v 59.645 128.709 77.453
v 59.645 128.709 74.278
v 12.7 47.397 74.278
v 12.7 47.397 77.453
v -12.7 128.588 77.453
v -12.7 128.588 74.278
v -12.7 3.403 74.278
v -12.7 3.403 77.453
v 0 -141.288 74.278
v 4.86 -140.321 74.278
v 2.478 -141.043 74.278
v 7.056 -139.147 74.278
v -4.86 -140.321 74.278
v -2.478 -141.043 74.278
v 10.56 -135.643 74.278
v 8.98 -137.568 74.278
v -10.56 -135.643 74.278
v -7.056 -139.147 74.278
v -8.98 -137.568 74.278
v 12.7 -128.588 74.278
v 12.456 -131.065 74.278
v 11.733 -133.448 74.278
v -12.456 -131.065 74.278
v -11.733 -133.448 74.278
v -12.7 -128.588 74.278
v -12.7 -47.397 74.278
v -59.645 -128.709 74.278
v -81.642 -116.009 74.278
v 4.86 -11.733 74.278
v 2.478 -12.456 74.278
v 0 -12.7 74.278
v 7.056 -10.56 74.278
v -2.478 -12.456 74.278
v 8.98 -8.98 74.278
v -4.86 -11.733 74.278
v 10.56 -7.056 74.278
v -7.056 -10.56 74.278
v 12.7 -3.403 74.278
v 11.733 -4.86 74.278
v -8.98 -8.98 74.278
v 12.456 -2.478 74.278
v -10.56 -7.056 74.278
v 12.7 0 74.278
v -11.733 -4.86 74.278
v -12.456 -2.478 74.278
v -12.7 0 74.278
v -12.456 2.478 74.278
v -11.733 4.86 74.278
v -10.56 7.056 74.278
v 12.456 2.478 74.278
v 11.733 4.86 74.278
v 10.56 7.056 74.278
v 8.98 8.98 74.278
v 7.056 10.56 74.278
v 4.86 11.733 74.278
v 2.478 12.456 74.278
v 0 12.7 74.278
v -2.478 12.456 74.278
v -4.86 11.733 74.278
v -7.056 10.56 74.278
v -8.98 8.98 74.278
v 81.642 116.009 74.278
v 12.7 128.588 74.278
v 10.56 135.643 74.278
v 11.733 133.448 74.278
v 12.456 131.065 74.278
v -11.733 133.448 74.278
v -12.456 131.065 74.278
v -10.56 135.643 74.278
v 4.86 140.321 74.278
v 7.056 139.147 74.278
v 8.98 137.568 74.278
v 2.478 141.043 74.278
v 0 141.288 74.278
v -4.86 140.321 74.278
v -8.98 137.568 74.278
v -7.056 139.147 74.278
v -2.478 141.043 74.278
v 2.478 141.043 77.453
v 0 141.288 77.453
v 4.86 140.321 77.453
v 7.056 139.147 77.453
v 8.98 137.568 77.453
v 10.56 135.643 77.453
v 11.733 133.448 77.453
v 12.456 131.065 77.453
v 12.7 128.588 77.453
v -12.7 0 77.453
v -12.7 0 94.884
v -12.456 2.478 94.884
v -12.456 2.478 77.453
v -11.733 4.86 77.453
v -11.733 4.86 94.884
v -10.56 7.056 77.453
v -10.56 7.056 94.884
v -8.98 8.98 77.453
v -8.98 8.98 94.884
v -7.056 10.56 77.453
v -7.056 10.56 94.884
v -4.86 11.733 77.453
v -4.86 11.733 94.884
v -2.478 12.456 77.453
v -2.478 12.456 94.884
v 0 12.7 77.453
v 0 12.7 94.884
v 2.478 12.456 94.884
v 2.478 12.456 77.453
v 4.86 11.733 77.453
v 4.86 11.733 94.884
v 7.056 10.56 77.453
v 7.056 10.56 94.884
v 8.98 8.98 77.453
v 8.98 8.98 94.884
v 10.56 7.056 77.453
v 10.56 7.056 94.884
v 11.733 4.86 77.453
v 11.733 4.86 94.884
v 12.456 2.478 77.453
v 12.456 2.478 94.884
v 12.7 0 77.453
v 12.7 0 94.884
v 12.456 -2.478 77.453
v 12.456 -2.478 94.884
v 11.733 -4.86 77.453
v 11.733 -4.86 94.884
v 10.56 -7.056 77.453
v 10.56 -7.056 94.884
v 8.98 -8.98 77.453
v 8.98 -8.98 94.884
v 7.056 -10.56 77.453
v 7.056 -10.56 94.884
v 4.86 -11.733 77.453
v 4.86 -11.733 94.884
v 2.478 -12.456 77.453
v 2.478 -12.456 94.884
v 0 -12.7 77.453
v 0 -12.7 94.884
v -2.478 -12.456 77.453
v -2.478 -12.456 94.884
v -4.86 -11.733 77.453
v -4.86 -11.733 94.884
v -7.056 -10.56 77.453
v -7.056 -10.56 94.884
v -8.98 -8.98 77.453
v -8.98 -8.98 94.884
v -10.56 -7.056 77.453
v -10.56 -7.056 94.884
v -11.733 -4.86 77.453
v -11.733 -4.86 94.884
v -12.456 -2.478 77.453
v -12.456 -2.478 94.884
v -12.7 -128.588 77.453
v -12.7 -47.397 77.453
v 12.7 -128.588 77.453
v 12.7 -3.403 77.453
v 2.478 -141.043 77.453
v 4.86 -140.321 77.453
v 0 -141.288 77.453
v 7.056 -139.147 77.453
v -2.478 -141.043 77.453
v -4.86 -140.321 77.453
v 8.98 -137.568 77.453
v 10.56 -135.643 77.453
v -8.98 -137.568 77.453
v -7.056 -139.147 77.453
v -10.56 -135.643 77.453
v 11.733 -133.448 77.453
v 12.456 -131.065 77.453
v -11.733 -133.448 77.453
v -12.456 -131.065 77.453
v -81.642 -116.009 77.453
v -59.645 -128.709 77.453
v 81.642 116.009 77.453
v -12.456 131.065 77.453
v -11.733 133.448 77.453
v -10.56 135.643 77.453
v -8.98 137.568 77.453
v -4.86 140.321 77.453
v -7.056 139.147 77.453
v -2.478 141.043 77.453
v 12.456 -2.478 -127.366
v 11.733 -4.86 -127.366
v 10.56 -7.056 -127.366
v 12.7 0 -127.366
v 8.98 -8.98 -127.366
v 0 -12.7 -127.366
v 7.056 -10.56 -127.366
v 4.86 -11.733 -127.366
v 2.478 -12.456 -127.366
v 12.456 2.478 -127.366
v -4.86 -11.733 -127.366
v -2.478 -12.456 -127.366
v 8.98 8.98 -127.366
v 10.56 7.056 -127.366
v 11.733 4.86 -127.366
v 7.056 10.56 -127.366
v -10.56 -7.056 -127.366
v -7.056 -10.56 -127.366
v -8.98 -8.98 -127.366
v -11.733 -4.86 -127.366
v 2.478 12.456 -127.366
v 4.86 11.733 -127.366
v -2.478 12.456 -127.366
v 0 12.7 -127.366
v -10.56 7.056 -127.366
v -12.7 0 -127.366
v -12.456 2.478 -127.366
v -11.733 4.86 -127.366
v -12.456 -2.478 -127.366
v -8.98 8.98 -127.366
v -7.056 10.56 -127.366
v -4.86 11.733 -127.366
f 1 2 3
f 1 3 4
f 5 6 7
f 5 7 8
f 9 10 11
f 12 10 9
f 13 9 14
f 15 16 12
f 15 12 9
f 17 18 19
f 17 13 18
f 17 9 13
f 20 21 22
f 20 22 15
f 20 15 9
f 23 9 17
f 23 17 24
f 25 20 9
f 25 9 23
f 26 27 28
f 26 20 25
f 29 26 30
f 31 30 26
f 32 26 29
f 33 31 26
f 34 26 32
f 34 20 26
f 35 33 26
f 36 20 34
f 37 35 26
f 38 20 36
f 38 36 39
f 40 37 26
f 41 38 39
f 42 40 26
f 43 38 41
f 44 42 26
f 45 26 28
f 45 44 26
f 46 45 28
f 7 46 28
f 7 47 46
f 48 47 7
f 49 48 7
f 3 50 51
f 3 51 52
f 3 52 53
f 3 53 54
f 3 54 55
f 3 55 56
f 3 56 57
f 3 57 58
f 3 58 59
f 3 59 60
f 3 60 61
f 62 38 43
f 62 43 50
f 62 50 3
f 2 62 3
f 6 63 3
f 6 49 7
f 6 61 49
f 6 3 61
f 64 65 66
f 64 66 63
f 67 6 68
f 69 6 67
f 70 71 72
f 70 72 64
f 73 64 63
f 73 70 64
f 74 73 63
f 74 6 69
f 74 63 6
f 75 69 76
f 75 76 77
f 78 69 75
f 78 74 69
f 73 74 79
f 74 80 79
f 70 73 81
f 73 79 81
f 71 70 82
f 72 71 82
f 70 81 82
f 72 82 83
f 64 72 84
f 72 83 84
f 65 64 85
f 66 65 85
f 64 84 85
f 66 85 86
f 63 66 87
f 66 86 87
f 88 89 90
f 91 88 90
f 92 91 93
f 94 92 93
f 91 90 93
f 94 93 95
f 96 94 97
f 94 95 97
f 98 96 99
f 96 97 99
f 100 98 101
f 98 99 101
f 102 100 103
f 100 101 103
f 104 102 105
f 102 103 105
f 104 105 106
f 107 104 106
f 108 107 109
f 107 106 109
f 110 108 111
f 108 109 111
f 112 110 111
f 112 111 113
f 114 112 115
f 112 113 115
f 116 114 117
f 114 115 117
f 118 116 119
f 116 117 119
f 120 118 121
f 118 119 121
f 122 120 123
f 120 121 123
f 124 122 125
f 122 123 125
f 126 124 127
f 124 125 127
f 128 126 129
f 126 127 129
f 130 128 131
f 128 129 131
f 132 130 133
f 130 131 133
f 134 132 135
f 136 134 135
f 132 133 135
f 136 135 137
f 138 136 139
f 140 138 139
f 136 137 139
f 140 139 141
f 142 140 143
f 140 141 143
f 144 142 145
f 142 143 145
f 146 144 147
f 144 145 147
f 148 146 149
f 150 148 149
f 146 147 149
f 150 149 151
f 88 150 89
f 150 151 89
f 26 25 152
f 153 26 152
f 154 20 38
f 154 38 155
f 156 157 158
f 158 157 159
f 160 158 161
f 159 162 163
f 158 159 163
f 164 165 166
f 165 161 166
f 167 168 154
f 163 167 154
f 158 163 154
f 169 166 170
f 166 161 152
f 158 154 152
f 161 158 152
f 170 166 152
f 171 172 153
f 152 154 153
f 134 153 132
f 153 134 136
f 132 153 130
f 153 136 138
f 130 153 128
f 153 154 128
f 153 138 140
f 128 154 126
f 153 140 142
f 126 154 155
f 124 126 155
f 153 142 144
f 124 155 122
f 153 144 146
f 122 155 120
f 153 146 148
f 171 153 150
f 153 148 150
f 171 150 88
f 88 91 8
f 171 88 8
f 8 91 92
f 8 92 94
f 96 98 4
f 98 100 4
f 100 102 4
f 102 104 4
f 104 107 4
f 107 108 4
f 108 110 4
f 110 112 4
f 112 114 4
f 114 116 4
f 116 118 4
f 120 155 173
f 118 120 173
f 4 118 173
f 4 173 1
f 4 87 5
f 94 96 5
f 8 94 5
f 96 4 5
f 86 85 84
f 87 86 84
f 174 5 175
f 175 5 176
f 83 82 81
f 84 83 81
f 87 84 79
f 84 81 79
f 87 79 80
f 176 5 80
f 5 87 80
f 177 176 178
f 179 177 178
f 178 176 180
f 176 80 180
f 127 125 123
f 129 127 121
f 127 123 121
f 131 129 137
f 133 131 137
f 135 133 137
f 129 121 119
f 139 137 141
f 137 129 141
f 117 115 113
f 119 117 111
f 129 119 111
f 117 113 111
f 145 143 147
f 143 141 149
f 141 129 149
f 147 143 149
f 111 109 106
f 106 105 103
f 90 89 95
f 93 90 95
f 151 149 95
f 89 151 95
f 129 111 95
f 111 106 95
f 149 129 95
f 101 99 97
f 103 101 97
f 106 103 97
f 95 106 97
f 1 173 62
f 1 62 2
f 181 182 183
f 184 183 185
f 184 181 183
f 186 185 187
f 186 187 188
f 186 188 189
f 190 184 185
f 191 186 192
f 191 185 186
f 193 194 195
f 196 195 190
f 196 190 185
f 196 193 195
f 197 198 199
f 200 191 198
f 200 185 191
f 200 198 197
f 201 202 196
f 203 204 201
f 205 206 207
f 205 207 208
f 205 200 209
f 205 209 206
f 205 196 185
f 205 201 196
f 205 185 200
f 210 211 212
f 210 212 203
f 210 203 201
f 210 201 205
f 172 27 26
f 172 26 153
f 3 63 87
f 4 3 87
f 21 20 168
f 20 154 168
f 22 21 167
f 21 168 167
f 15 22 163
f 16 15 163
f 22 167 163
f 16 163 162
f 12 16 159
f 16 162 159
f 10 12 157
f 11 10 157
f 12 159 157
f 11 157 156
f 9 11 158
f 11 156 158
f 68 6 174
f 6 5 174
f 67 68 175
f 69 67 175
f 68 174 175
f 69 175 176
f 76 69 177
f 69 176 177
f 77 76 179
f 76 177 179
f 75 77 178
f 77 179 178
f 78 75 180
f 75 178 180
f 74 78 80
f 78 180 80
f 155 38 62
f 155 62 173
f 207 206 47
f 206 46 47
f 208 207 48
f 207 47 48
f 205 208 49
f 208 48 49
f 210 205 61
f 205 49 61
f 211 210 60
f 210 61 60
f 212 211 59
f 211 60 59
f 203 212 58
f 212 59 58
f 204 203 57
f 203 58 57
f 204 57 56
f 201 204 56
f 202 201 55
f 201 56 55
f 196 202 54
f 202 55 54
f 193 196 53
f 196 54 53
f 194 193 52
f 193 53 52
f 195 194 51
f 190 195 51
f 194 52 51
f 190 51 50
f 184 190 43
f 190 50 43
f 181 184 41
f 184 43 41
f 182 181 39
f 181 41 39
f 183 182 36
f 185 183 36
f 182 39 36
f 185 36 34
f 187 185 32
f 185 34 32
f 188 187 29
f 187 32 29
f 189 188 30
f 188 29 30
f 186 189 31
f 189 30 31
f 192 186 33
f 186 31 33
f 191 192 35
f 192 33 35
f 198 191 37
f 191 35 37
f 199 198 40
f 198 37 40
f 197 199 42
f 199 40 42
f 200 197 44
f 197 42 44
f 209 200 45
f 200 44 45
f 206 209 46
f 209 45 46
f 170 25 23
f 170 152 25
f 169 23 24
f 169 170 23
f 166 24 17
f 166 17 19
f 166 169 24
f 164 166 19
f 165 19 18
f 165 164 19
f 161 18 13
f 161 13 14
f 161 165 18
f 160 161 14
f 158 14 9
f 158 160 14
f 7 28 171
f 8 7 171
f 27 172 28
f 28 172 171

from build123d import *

# Parameters (mm, degrees)
F0_W     = 12.7
F0_H     = 222.25
F3_W     = 25.4
F3_H     = 3.175
F4_DEPTH = 141.2875
F6_R     = 12.69999
F8_W     = 25.4
F8_H     = 3.175
F9_DEPTH = 141.2875


# Not quite as in the source:
# - a fillet or chamfer is up to 0.001 mm smaller than in the source, because OpenCascade refuses the exact size


with BuildPart() as f1:
    # F0 (on Front) → F1 (revolve)
    with BuildSketch(Plane.XZ):
        with Locations((-6.35, -16.2413566351)):
            Rectangle(F0_W, F0_H)
    revolve(axis=Axis((0, 0, -16.2413566351), (0, 0, -1)))

    # F3 (on Front) → F4 (join, symmetric)
    with BuildSketch(Plane.XZ):
        with Locations((0, 75.8653144777)):
            Rectangle(F3_W, F3_H)
    extrude(amount=F4_DEPTH, both=True)

    # F6 (radius 12.7 in the source; OpenCascade refuses exactly that, so slightly less here)
    f6_edges = [f1.edges().sort_by_distance(p)[0] for p in [
        (12.7, 141.2875, 75.865314),
        (-12.7, 141.2875, 75.865314),
        (-12.7, -141.2875, 75.865314),
        (12.7, -141.2875, 75.865314),
    ]]
    fillet(f6_edges, radius=F6_R)

    # F8 (on line) → F9 (join, symmetric)
    with BuildSketch(Plane(origin=(0, 0, 0), x_dir=(-0.8660254038, 0.5, 0), z_dir=(0.5, 0.8660254038, 0))):
        with Locations((0, 75.8653144777)):
            Rectangle(F8_W, F8_H)
    extrude(amount=F9_DEPTH, both=True)


solid = f1.part
